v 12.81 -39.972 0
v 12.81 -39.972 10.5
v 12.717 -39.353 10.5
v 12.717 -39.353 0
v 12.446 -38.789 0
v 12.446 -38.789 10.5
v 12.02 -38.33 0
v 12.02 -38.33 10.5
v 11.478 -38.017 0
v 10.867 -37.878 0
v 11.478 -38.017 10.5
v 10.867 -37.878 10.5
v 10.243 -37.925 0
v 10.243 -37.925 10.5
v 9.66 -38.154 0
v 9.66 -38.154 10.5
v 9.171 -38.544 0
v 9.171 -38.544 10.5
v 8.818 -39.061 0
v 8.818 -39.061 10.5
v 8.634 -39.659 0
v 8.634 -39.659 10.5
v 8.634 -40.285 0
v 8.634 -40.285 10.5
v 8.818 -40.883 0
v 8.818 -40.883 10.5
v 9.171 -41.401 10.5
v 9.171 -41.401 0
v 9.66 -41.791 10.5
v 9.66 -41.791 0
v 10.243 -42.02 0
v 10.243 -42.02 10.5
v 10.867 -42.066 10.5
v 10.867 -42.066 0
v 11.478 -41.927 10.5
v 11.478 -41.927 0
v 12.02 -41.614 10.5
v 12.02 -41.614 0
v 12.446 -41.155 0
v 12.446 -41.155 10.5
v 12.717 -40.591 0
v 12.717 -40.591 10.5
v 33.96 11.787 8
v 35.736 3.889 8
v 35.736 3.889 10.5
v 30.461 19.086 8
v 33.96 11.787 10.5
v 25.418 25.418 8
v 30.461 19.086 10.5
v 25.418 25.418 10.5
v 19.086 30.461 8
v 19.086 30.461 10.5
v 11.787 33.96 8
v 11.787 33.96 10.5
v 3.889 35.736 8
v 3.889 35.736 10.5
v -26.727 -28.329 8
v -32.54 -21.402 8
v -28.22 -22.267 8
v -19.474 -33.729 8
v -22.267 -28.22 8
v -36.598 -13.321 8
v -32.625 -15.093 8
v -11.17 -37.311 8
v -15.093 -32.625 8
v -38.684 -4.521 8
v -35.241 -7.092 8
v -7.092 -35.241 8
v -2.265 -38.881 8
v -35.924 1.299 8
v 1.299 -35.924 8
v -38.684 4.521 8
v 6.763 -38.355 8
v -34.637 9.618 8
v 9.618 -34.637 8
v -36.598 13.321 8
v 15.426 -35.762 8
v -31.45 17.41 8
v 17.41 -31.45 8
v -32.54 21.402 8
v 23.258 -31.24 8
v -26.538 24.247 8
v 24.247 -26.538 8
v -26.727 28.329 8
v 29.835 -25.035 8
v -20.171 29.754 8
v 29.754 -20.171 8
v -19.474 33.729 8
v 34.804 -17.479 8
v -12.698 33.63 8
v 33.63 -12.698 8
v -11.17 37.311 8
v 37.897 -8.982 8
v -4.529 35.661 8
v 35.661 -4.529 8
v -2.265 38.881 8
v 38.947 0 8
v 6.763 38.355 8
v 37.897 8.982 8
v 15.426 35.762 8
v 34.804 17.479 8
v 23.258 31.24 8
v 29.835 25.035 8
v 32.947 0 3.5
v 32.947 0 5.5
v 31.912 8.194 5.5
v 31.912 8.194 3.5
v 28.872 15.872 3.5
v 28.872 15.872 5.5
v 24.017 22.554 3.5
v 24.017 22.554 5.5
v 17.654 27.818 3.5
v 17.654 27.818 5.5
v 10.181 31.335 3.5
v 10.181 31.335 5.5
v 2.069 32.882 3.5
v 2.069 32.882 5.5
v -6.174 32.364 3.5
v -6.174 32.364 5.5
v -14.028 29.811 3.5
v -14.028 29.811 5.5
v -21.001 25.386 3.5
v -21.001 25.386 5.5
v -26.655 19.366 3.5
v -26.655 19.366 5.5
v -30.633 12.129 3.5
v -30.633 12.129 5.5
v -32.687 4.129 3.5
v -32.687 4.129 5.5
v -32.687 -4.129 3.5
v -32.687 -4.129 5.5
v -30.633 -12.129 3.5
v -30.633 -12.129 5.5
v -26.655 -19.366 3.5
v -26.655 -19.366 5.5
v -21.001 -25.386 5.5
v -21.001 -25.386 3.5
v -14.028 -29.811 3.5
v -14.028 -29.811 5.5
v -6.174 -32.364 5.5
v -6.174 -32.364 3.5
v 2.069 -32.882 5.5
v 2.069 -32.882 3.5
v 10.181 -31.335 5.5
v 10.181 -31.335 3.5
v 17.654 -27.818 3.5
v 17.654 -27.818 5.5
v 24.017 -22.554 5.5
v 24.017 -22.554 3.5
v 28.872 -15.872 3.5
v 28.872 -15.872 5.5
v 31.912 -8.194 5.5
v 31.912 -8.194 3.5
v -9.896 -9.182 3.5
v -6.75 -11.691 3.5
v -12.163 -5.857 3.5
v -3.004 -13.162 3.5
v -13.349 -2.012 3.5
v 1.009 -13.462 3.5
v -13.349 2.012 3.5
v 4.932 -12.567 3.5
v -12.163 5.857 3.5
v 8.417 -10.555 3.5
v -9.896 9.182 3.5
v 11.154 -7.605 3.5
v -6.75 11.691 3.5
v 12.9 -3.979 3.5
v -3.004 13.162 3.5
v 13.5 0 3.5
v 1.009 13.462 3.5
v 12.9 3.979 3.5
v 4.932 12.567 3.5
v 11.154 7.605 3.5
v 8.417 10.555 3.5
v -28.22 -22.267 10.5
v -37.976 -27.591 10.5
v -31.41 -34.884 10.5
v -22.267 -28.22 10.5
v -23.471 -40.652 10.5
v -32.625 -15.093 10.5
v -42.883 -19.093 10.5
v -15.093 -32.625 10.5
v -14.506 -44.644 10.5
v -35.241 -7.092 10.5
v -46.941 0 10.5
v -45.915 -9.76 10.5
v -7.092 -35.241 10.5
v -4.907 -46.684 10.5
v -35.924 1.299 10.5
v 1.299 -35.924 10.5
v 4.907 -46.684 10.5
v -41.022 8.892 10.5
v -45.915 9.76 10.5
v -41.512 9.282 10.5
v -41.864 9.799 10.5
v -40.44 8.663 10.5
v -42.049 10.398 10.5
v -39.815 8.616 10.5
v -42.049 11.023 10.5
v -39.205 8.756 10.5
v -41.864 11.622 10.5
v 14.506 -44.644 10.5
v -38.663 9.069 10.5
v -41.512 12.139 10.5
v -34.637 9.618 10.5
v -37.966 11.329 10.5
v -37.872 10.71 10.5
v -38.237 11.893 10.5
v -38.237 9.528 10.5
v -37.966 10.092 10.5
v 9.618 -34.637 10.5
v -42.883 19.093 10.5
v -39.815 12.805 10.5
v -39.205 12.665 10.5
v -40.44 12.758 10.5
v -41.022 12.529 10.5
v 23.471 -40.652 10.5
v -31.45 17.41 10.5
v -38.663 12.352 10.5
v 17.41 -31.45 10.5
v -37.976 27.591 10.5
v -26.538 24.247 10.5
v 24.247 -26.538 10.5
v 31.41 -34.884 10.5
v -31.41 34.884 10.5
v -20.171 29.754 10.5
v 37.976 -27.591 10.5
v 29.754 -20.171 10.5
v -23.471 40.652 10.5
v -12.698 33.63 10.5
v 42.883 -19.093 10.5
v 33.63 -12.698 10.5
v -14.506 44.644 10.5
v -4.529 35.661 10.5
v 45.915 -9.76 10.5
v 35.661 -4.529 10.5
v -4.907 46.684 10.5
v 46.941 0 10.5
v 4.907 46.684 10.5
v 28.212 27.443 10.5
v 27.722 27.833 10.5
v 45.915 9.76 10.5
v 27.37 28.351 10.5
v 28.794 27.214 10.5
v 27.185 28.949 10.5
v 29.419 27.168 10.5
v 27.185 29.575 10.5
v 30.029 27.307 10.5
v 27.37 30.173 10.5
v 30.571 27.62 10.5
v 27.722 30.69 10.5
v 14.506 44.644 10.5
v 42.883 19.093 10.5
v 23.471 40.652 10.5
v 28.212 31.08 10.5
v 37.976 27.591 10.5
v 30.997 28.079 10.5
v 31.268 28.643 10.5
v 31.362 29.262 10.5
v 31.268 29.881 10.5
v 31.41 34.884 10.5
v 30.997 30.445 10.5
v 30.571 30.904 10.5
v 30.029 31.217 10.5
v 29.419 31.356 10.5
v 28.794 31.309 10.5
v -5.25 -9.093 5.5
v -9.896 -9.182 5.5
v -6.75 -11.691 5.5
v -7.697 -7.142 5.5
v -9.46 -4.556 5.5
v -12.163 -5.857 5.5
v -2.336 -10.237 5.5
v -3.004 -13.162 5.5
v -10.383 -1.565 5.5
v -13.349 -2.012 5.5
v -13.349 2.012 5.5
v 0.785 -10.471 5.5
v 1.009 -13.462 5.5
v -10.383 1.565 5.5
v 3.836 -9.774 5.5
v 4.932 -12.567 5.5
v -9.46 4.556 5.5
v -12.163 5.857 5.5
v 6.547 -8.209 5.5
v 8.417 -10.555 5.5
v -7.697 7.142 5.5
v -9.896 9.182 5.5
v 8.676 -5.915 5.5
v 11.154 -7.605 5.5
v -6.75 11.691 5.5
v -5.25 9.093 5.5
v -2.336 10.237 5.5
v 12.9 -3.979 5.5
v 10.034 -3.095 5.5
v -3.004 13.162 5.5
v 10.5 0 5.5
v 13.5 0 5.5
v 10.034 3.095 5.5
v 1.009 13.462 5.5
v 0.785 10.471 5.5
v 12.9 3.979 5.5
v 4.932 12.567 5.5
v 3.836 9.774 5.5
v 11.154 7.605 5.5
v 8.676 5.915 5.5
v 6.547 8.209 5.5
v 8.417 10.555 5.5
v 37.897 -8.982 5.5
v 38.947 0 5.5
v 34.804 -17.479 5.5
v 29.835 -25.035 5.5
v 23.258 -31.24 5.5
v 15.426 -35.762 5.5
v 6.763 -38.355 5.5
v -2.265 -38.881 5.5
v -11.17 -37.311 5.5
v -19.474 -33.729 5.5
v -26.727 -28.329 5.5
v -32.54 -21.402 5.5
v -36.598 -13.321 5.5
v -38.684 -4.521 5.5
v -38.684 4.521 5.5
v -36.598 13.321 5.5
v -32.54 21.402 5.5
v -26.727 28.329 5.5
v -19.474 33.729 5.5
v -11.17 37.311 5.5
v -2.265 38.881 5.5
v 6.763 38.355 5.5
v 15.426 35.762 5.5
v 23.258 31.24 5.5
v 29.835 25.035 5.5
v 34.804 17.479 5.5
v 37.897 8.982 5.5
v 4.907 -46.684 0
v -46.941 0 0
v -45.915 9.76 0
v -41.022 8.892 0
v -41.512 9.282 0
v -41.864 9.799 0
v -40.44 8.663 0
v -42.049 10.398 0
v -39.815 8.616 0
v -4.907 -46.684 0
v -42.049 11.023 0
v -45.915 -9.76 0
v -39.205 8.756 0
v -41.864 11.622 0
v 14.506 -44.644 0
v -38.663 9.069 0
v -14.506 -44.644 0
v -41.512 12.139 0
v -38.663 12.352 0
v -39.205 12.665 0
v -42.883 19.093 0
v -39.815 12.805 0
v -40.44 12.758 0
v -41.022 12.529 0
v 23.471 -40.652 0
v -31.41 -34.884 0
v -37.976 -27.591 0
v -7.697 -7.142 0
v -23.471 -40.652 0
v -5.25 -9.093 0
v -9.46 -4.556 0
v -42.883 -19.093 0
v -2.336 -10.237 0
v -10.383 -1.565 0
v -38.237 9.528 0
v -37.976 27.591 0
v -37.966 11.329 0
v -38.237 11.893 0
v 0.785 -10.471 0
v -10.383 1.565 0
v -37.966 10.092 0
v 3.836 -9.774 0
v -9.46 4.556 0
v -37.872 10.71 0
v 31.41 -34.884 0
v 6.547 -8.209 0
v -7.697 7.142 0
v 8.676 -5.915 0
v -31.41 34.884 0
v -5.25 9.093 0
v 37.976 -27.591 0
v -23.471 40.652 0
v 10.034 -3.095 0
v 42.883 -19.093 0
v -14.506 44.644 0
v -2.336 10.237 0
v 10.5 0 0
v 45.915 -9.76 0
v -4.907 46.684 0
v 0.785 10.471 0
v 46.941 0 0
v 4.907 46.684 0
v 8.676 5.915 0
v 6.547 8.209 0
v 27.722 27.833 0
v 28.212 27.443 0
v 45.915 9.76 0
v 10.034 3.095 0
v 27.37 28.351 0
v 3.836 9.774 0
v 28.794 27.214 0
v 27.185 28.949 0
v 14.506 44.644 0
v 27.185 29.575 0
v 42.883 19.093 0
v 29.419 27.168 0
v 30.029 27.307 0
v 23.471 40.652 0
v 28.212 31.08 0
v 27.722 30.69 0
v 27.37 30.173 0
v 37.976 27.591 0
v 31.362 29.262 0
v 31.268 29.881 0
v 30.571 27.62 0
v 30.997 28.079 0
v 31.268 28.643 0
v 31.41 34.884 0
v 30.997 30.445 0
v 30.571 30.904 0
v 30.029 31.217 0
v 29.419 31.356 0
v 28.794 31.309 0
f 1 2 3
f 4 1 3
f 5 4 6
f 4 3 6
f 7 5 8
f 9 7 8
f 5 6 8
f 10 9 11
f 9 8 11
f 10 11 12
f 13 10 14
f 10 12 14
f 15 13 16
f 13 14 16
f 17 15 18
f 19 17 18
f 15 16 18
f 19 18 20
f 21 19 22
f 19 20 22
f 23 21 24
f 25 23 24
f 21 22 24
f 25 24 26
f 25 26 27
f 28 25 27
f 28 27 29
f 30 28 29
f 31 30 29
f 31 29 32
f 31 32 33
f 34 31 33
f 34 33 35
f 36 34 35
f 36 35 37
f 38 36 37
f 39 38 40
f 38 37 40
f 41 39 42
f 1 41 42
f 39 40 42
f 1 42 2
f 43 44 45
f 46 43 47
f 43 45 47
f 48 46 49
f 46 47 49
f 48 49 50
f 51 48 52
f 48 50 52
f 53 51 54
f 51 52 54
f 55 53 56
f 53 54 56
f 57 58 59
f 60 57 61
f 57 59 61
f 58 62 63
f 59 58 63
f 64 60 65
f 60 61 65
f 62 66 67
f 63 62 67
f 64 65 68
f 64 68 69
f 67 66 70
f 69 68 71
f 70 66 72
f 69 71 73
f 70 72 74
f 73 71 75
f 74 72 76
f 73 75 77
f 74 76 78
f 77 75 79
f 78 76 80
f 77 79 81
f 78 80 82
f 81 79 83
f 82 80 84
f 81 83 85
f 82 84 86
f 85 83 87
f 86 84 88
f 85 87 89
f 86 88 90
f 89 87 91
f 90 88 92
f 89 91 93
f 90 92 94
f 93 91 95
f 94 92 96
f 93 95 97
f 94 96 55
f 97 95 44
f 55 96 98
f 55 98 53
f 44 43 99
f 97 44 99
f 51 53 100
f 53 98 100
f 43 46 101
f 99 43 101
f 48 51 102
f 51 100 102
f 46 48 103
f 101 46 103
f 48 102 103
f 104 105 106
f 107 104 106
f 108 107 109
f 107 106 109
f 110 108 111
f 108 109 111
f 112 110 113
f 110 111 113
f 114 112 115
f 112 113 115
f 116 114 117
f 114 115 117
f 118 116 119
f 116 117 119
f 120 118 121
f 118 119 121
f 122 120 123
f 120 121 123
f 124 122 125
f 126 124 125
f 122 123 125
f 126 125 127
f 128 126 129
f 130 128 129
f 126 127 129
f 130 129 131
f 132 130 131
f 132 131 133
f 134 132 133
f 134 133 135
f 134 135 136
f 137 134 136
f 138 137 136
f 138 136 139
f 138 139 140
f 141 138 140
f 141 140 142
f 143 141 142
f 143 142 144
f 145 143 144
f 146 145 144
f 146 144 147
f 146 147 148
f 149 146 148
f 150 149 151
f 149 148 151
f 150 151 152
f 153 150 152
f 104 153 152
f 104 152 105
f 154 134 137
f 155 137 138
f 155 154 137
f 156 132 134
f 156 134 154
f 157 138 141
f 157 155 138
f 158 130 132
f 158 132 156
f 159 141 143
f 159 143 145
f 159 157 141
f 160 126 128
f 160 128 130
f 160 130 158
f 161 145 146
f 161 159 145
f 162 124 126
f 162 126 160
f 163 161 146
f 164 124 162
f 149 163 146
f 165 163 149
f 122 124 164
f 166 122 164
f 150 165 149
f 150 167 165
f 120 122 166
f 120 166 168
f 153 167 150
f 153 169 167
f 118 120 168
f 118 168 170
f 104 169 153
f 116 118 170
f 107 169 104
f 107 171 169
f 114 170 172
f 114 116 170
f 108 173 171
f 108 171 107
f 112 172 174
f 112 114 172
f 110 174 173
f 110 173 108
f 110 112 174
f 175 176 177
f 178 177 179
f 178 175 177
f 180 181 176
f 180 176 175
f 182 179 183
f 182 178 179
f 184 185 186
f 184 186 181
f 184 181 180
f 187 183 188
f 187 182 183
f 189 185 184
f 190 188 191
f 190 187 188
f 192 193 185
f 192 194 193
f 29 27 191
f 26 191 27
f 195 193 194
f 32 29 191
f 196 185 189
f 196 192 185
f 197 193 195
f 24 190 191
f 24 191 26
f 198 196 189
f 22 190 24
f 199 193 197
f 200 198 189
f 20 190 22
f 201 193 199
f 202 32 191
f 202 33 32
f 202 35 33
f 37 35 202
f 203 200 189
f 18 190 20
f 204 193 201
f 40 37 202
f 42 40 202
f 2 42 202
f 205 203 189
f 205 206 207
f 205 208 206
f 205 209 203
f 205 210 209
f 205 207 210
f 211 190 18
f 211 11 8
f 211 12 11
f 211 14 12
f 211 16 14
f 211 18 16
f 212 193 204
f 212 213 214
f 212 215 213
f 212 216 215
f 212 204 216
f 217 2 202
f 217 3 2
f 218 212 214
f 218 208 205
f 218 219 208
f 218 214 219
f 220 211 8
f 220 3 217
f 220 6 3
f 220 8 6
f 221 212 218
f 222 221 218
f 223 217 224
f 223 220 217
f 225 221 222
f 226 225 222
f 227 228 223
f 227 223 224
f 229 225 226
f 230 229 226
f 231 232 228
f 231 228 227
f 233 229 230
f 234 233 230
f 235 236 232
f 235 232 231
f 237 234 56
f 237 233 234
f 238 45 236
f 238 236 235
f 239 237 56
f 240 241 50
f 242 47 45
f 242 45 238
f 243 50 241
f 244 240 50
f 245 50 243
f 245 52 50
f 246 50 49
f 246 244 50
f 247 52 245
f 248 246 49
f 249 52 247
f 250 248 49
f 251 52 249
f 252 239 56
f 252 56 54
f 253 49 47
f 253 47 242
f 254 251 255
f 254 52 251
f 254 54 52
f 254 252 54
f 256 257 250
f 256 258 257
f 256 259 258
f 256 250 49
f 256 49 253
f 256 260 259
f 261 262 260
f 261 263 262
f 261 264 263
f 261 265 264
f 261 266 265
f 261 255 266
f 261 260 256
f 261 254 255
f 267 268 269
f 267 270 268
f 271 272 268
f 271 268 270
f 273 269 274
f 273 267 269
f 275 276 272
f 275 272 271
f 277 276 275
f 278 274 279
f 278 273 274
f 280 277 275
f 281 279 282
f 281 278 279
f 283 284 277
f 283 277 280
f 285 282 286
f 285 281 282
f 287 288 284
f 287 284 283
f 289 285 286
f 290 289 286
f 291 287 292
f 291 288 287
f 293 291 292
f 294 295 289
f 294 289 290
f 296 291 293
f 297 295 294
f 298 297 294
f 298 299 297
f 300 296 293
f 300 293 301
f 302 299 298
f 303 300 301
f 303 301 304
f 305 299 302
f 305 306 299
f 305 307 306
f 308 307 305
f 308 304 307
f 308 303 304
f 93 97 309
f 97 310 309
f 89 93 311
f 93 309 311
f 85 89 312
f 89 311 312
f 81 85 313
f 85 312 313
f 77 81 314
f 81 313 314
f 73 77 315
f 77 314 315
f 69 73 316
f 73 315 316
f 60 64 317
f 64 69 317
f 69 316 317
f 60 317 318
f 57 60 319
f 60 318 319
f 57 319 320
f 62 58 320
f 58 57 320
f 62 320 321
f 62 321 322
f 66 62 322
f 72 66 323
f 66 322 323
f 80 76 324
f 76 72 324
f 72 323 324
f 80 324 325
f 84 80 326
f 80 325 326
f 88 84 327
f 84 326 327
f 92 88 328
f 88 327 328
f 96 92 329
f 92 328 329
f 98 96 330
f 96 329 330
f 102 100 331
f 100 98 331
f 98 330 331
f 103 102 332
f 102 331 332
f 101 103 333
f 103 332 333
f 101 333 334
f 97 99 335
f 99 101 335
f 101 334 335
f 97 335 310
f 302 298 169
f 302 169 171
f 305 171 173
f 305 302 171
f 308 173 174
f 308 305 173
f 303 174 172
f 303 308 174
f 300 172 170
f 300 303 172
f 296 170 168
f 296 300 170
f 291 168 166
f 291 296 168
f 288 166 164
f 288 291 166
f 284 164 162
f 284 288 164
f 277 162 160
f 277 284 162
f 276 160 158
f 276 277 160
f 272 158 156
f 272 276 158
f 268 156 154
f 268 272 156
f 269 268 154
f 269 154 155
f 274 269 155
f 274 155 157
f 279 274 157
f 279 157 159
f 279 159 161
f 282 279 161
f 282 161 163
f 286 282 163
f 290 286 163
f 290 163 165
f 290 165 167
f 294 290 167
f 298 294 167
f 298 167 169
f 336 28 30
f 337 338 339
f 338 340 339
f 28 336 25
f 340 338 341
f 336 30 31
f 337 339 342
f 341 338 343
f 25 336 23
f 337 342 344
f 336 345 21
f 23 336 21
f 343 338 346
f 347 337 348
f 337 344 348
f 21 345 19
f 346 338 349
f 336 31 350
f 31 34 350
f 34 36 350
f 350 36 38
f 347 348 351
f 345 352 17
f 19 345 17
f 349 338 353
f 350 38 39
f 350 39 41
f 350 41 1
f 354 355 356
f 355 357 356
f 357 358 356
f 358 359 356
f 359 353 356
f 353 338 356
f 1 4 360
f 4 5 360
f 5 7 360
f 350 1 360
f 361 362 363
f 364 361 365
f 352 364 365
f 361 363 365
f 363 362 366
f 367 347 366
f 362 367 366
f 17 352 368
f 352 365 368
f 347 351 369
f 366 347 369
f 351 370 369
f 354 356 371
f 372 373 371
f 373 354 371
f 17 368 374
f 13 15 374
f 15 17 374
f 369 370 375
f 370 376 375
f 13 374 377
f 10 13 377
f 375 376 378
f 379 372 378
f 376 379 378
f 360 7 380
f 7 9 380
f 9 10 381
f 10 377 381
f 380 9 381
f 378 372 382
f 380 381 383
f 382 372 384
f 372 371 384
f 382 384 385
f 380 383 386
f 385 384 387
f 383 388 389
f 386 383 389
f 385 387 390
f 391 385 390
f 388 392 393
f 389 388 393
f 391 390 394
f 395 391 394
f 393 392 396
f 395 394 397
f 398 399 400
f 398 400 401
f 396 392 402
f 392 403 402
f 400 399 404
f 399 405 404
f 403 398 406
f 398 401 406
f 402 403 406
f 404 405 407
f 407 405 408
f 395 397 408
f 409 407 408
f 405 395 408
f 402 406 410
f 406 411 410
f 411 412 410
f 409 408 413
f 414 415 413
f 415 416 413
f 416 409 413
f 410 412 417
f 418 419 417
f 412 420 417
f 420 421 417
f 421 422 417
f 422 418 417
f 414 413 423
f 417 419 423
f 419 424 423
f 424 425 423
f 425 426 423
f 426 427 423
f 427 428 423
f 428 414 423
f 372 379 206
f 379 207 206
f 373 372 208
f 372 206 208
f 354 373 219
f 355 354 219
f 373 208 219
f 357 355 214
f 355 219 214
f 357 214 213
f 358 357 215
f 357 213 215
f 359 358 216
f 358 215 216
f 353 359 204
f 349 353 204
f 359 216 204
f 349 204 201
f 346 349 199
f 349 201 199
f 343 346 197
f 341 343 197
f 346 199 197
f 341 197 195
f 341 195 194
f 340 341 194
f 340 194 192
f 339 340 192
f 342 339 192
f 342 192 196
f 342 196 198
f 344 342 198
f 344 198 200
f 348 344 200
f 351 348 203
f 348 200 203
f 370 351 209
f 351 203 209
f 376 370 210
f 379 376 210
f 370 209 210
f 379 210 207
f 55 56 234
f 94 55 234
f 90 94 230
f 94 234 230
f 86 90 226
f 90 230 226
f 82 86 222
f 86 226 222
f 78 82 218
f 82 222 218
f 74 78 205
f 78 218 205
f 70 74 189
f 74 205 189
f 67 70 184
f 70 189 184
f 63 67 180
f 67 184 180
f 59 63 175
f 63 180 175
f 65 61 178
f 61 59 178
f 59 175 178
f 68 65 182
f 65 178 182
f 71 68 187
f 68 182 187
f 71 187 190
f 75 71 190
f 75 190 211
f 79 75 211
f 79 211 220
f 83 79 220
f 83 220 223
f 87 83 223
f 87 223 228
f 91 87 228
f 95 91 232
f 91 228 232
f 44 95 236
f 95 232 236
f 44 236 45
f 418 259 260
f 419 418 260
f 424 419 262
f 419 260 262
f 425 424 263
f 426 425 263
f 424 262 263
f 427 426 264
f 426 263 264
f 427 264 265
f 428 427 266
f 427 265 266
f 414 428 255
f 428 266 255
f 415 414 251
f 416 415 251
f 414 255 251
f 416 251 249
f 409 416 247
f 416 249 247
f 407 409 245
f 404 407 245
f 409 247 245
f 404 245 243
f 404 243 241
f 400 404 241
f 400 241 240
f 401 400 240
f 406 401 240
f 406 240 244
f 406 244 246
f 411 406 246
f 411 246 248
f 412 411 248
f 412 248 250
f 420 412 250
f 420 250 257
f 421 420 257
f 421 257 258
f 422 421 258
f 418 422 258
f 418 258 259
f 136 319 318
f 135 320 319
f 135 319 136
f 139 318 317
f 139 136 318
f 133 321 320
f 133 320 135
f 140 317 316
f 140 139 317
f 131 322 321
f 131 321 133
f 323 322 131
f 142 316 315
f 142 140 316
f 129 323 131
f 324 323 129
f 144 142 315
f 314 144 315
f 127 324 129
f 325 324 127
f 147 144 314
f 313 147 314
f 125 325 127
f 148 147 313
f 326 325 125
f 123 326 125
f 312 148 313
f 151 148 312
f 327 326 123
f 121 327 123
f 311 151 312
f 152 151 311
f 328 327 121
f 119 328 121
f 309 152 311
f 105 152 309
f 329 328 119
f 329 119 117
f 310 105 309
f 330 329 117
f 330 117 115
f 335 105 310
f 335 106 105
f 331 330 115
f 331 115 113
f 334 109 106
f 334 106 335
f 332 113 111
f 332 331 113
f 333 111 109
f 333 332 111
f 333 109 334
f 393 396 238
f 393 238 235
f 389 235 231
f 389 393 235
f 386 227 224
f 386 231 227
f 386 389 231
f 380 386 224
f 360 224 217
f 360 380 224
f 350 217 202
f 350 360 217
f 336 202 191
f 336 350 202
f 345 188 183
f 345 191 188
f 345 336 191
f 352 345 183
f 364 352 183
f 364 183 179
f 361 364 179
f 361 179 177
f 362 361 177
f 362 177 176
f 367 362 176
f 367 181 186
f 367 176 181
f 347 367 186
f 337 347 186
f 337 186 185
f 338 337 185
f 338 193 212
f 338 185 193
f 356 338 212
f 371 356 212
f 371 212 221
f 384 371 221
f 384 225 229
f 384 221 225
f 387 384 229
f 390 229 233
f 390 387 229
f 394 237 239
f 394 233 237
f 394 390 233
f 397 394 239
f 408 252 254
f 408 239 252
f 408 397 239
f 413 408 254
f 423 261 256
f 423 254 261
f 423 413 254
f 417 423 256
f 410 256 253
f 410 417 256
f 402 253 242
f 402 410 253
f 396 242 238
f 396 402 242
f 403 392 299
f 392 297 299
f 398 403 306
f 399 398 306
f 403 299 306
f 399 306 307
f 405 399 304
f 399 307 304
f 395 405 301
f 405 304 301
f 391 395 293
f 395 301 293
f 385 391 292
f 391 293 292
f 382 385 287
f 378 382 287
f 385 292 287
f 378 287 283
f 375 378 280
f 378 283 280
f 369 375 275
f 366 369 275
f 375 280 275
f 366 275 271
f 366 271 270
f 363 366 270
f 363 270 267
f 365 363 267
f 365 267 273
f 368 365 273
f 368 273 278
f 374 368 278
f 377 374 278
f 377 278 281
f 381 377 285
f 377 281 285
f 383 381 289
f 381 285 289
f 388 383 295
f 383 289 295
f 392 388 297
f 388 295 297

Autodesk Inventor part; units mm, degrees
ref_plane "YZ Plane" through (0, 0, 0) normal (1, 0, 0) x (0, 1, 0)
ref_plane "XZ Plane" through (0, 0, 0) normal (0, 1, 0) x (-1, 0, 0)
ref_plane "XY Plane" through (0, 0, 0) normal (0, 0, 1) x (1, 0, 0)
sketch "スケッチ1" plane through (0, 0, 0) normal (0, 0, 1) x (1, 0, 0)
  circle A0 centre (0, 0) radius 46.9412
  dimension "d3" = 93.8824
extrude "押し出し1" add sketch "スケッチ1" along normal blind 10.5
sketch "スケッチ2" plane through (0, 0, 10.5) normal (0, 0, 1) x (1, 0, 0)
  circle A0 centre (0, 0) radius 46.9412
  arc A1 (35.7361, 3.8892) -> (3.8892, 35.7361) centre (0, 0) ccw
  circle A2 centre (29.2617, 29.2617) radius 2.1
  circle A3 centre (-39.9723, 10.7105) radius 2.1
  circle A4 centre (10.7105, -39.9723) radius 2.1
  circle A5 centre (0, 0) radius 35.9471
  dimension "d4" = 4.2
extrude "押し出し2" cut sketch "スケッチ2" against normal blind 5 contours A5 A1
sketch "スケッチ3" plane through (0, 0, 10.5) normal (0, 0, 1) x (1, 0, 0)
  circle A0 centre (0, 0) radius 46.9412
  arc A1 (-5.0225, 35.5945) -> (35.5945, -5.0225) centre (0, 0) ccw
  arc A2 (35.7361, 3.8892) -> (3.8892, 35.7361) centre (0, 0) ccw
  circle A3 centre (29.2617, 29.2617) radius 2.1
  circle A4 centre (-39.9723, 10.7105) radius 2.1
  circle A5 centre (10.7105, -39.9723) radius 2.1
  circle A6 centre (0, 0) radius 35.9471
  dimension "d7" = 4.2
extrude "押し出し3" cut sketch "スケッチ3" against normal blind 10.5 contours A3 | A4 | A5
sketch "スケッチ4" plane through (0, 0, 5.5) normal (0, 0, 1) x (1, 0, 0)
  circle A0 centre (0, 0) radius 10.5
  circle A1 centre (0, 0) radius 10.5
extrude "押し出し4" cut sketch "スケッチ4" against normal blind 10.5
sketch "スケッチ5" plane through (0, 0, 5.5) normal (0, 0, 1) x (1, 0, 0)
  circle A0 centre (0, 0) radius 10.5 projected
  circle A1 centre (0, 0) radius 35.9471 projected
  circle A2 centre (0, 0) radius 13.5
  circle A3 centre (0, 0) radius 32.9471
  dimension "d12" = 3
  dimension "d13" = 3
extrude "押し出し5" cut sketch "スケッチ5" against normal blind 2 contours A3
sketch "スケッチ6" plane through (0, 0, 5.5) normal (0, 0, 1) x (1, 0, 0)
  point P0 (0, 0)
sketch "スケッチ7" plane through (0, 0, 5.5) normal (0, 0, 1) x (1, 0, 0)
  circle A0 centre (0, 0) radius 38.9471
  circle A1 centre (0, 0) radius 35.9471 projected
  dimension "d16" = 3
extrude "押し出し6" cut sketch "スケッチ7" along normal blind 2.5
properties part number "fix_plate_2"
